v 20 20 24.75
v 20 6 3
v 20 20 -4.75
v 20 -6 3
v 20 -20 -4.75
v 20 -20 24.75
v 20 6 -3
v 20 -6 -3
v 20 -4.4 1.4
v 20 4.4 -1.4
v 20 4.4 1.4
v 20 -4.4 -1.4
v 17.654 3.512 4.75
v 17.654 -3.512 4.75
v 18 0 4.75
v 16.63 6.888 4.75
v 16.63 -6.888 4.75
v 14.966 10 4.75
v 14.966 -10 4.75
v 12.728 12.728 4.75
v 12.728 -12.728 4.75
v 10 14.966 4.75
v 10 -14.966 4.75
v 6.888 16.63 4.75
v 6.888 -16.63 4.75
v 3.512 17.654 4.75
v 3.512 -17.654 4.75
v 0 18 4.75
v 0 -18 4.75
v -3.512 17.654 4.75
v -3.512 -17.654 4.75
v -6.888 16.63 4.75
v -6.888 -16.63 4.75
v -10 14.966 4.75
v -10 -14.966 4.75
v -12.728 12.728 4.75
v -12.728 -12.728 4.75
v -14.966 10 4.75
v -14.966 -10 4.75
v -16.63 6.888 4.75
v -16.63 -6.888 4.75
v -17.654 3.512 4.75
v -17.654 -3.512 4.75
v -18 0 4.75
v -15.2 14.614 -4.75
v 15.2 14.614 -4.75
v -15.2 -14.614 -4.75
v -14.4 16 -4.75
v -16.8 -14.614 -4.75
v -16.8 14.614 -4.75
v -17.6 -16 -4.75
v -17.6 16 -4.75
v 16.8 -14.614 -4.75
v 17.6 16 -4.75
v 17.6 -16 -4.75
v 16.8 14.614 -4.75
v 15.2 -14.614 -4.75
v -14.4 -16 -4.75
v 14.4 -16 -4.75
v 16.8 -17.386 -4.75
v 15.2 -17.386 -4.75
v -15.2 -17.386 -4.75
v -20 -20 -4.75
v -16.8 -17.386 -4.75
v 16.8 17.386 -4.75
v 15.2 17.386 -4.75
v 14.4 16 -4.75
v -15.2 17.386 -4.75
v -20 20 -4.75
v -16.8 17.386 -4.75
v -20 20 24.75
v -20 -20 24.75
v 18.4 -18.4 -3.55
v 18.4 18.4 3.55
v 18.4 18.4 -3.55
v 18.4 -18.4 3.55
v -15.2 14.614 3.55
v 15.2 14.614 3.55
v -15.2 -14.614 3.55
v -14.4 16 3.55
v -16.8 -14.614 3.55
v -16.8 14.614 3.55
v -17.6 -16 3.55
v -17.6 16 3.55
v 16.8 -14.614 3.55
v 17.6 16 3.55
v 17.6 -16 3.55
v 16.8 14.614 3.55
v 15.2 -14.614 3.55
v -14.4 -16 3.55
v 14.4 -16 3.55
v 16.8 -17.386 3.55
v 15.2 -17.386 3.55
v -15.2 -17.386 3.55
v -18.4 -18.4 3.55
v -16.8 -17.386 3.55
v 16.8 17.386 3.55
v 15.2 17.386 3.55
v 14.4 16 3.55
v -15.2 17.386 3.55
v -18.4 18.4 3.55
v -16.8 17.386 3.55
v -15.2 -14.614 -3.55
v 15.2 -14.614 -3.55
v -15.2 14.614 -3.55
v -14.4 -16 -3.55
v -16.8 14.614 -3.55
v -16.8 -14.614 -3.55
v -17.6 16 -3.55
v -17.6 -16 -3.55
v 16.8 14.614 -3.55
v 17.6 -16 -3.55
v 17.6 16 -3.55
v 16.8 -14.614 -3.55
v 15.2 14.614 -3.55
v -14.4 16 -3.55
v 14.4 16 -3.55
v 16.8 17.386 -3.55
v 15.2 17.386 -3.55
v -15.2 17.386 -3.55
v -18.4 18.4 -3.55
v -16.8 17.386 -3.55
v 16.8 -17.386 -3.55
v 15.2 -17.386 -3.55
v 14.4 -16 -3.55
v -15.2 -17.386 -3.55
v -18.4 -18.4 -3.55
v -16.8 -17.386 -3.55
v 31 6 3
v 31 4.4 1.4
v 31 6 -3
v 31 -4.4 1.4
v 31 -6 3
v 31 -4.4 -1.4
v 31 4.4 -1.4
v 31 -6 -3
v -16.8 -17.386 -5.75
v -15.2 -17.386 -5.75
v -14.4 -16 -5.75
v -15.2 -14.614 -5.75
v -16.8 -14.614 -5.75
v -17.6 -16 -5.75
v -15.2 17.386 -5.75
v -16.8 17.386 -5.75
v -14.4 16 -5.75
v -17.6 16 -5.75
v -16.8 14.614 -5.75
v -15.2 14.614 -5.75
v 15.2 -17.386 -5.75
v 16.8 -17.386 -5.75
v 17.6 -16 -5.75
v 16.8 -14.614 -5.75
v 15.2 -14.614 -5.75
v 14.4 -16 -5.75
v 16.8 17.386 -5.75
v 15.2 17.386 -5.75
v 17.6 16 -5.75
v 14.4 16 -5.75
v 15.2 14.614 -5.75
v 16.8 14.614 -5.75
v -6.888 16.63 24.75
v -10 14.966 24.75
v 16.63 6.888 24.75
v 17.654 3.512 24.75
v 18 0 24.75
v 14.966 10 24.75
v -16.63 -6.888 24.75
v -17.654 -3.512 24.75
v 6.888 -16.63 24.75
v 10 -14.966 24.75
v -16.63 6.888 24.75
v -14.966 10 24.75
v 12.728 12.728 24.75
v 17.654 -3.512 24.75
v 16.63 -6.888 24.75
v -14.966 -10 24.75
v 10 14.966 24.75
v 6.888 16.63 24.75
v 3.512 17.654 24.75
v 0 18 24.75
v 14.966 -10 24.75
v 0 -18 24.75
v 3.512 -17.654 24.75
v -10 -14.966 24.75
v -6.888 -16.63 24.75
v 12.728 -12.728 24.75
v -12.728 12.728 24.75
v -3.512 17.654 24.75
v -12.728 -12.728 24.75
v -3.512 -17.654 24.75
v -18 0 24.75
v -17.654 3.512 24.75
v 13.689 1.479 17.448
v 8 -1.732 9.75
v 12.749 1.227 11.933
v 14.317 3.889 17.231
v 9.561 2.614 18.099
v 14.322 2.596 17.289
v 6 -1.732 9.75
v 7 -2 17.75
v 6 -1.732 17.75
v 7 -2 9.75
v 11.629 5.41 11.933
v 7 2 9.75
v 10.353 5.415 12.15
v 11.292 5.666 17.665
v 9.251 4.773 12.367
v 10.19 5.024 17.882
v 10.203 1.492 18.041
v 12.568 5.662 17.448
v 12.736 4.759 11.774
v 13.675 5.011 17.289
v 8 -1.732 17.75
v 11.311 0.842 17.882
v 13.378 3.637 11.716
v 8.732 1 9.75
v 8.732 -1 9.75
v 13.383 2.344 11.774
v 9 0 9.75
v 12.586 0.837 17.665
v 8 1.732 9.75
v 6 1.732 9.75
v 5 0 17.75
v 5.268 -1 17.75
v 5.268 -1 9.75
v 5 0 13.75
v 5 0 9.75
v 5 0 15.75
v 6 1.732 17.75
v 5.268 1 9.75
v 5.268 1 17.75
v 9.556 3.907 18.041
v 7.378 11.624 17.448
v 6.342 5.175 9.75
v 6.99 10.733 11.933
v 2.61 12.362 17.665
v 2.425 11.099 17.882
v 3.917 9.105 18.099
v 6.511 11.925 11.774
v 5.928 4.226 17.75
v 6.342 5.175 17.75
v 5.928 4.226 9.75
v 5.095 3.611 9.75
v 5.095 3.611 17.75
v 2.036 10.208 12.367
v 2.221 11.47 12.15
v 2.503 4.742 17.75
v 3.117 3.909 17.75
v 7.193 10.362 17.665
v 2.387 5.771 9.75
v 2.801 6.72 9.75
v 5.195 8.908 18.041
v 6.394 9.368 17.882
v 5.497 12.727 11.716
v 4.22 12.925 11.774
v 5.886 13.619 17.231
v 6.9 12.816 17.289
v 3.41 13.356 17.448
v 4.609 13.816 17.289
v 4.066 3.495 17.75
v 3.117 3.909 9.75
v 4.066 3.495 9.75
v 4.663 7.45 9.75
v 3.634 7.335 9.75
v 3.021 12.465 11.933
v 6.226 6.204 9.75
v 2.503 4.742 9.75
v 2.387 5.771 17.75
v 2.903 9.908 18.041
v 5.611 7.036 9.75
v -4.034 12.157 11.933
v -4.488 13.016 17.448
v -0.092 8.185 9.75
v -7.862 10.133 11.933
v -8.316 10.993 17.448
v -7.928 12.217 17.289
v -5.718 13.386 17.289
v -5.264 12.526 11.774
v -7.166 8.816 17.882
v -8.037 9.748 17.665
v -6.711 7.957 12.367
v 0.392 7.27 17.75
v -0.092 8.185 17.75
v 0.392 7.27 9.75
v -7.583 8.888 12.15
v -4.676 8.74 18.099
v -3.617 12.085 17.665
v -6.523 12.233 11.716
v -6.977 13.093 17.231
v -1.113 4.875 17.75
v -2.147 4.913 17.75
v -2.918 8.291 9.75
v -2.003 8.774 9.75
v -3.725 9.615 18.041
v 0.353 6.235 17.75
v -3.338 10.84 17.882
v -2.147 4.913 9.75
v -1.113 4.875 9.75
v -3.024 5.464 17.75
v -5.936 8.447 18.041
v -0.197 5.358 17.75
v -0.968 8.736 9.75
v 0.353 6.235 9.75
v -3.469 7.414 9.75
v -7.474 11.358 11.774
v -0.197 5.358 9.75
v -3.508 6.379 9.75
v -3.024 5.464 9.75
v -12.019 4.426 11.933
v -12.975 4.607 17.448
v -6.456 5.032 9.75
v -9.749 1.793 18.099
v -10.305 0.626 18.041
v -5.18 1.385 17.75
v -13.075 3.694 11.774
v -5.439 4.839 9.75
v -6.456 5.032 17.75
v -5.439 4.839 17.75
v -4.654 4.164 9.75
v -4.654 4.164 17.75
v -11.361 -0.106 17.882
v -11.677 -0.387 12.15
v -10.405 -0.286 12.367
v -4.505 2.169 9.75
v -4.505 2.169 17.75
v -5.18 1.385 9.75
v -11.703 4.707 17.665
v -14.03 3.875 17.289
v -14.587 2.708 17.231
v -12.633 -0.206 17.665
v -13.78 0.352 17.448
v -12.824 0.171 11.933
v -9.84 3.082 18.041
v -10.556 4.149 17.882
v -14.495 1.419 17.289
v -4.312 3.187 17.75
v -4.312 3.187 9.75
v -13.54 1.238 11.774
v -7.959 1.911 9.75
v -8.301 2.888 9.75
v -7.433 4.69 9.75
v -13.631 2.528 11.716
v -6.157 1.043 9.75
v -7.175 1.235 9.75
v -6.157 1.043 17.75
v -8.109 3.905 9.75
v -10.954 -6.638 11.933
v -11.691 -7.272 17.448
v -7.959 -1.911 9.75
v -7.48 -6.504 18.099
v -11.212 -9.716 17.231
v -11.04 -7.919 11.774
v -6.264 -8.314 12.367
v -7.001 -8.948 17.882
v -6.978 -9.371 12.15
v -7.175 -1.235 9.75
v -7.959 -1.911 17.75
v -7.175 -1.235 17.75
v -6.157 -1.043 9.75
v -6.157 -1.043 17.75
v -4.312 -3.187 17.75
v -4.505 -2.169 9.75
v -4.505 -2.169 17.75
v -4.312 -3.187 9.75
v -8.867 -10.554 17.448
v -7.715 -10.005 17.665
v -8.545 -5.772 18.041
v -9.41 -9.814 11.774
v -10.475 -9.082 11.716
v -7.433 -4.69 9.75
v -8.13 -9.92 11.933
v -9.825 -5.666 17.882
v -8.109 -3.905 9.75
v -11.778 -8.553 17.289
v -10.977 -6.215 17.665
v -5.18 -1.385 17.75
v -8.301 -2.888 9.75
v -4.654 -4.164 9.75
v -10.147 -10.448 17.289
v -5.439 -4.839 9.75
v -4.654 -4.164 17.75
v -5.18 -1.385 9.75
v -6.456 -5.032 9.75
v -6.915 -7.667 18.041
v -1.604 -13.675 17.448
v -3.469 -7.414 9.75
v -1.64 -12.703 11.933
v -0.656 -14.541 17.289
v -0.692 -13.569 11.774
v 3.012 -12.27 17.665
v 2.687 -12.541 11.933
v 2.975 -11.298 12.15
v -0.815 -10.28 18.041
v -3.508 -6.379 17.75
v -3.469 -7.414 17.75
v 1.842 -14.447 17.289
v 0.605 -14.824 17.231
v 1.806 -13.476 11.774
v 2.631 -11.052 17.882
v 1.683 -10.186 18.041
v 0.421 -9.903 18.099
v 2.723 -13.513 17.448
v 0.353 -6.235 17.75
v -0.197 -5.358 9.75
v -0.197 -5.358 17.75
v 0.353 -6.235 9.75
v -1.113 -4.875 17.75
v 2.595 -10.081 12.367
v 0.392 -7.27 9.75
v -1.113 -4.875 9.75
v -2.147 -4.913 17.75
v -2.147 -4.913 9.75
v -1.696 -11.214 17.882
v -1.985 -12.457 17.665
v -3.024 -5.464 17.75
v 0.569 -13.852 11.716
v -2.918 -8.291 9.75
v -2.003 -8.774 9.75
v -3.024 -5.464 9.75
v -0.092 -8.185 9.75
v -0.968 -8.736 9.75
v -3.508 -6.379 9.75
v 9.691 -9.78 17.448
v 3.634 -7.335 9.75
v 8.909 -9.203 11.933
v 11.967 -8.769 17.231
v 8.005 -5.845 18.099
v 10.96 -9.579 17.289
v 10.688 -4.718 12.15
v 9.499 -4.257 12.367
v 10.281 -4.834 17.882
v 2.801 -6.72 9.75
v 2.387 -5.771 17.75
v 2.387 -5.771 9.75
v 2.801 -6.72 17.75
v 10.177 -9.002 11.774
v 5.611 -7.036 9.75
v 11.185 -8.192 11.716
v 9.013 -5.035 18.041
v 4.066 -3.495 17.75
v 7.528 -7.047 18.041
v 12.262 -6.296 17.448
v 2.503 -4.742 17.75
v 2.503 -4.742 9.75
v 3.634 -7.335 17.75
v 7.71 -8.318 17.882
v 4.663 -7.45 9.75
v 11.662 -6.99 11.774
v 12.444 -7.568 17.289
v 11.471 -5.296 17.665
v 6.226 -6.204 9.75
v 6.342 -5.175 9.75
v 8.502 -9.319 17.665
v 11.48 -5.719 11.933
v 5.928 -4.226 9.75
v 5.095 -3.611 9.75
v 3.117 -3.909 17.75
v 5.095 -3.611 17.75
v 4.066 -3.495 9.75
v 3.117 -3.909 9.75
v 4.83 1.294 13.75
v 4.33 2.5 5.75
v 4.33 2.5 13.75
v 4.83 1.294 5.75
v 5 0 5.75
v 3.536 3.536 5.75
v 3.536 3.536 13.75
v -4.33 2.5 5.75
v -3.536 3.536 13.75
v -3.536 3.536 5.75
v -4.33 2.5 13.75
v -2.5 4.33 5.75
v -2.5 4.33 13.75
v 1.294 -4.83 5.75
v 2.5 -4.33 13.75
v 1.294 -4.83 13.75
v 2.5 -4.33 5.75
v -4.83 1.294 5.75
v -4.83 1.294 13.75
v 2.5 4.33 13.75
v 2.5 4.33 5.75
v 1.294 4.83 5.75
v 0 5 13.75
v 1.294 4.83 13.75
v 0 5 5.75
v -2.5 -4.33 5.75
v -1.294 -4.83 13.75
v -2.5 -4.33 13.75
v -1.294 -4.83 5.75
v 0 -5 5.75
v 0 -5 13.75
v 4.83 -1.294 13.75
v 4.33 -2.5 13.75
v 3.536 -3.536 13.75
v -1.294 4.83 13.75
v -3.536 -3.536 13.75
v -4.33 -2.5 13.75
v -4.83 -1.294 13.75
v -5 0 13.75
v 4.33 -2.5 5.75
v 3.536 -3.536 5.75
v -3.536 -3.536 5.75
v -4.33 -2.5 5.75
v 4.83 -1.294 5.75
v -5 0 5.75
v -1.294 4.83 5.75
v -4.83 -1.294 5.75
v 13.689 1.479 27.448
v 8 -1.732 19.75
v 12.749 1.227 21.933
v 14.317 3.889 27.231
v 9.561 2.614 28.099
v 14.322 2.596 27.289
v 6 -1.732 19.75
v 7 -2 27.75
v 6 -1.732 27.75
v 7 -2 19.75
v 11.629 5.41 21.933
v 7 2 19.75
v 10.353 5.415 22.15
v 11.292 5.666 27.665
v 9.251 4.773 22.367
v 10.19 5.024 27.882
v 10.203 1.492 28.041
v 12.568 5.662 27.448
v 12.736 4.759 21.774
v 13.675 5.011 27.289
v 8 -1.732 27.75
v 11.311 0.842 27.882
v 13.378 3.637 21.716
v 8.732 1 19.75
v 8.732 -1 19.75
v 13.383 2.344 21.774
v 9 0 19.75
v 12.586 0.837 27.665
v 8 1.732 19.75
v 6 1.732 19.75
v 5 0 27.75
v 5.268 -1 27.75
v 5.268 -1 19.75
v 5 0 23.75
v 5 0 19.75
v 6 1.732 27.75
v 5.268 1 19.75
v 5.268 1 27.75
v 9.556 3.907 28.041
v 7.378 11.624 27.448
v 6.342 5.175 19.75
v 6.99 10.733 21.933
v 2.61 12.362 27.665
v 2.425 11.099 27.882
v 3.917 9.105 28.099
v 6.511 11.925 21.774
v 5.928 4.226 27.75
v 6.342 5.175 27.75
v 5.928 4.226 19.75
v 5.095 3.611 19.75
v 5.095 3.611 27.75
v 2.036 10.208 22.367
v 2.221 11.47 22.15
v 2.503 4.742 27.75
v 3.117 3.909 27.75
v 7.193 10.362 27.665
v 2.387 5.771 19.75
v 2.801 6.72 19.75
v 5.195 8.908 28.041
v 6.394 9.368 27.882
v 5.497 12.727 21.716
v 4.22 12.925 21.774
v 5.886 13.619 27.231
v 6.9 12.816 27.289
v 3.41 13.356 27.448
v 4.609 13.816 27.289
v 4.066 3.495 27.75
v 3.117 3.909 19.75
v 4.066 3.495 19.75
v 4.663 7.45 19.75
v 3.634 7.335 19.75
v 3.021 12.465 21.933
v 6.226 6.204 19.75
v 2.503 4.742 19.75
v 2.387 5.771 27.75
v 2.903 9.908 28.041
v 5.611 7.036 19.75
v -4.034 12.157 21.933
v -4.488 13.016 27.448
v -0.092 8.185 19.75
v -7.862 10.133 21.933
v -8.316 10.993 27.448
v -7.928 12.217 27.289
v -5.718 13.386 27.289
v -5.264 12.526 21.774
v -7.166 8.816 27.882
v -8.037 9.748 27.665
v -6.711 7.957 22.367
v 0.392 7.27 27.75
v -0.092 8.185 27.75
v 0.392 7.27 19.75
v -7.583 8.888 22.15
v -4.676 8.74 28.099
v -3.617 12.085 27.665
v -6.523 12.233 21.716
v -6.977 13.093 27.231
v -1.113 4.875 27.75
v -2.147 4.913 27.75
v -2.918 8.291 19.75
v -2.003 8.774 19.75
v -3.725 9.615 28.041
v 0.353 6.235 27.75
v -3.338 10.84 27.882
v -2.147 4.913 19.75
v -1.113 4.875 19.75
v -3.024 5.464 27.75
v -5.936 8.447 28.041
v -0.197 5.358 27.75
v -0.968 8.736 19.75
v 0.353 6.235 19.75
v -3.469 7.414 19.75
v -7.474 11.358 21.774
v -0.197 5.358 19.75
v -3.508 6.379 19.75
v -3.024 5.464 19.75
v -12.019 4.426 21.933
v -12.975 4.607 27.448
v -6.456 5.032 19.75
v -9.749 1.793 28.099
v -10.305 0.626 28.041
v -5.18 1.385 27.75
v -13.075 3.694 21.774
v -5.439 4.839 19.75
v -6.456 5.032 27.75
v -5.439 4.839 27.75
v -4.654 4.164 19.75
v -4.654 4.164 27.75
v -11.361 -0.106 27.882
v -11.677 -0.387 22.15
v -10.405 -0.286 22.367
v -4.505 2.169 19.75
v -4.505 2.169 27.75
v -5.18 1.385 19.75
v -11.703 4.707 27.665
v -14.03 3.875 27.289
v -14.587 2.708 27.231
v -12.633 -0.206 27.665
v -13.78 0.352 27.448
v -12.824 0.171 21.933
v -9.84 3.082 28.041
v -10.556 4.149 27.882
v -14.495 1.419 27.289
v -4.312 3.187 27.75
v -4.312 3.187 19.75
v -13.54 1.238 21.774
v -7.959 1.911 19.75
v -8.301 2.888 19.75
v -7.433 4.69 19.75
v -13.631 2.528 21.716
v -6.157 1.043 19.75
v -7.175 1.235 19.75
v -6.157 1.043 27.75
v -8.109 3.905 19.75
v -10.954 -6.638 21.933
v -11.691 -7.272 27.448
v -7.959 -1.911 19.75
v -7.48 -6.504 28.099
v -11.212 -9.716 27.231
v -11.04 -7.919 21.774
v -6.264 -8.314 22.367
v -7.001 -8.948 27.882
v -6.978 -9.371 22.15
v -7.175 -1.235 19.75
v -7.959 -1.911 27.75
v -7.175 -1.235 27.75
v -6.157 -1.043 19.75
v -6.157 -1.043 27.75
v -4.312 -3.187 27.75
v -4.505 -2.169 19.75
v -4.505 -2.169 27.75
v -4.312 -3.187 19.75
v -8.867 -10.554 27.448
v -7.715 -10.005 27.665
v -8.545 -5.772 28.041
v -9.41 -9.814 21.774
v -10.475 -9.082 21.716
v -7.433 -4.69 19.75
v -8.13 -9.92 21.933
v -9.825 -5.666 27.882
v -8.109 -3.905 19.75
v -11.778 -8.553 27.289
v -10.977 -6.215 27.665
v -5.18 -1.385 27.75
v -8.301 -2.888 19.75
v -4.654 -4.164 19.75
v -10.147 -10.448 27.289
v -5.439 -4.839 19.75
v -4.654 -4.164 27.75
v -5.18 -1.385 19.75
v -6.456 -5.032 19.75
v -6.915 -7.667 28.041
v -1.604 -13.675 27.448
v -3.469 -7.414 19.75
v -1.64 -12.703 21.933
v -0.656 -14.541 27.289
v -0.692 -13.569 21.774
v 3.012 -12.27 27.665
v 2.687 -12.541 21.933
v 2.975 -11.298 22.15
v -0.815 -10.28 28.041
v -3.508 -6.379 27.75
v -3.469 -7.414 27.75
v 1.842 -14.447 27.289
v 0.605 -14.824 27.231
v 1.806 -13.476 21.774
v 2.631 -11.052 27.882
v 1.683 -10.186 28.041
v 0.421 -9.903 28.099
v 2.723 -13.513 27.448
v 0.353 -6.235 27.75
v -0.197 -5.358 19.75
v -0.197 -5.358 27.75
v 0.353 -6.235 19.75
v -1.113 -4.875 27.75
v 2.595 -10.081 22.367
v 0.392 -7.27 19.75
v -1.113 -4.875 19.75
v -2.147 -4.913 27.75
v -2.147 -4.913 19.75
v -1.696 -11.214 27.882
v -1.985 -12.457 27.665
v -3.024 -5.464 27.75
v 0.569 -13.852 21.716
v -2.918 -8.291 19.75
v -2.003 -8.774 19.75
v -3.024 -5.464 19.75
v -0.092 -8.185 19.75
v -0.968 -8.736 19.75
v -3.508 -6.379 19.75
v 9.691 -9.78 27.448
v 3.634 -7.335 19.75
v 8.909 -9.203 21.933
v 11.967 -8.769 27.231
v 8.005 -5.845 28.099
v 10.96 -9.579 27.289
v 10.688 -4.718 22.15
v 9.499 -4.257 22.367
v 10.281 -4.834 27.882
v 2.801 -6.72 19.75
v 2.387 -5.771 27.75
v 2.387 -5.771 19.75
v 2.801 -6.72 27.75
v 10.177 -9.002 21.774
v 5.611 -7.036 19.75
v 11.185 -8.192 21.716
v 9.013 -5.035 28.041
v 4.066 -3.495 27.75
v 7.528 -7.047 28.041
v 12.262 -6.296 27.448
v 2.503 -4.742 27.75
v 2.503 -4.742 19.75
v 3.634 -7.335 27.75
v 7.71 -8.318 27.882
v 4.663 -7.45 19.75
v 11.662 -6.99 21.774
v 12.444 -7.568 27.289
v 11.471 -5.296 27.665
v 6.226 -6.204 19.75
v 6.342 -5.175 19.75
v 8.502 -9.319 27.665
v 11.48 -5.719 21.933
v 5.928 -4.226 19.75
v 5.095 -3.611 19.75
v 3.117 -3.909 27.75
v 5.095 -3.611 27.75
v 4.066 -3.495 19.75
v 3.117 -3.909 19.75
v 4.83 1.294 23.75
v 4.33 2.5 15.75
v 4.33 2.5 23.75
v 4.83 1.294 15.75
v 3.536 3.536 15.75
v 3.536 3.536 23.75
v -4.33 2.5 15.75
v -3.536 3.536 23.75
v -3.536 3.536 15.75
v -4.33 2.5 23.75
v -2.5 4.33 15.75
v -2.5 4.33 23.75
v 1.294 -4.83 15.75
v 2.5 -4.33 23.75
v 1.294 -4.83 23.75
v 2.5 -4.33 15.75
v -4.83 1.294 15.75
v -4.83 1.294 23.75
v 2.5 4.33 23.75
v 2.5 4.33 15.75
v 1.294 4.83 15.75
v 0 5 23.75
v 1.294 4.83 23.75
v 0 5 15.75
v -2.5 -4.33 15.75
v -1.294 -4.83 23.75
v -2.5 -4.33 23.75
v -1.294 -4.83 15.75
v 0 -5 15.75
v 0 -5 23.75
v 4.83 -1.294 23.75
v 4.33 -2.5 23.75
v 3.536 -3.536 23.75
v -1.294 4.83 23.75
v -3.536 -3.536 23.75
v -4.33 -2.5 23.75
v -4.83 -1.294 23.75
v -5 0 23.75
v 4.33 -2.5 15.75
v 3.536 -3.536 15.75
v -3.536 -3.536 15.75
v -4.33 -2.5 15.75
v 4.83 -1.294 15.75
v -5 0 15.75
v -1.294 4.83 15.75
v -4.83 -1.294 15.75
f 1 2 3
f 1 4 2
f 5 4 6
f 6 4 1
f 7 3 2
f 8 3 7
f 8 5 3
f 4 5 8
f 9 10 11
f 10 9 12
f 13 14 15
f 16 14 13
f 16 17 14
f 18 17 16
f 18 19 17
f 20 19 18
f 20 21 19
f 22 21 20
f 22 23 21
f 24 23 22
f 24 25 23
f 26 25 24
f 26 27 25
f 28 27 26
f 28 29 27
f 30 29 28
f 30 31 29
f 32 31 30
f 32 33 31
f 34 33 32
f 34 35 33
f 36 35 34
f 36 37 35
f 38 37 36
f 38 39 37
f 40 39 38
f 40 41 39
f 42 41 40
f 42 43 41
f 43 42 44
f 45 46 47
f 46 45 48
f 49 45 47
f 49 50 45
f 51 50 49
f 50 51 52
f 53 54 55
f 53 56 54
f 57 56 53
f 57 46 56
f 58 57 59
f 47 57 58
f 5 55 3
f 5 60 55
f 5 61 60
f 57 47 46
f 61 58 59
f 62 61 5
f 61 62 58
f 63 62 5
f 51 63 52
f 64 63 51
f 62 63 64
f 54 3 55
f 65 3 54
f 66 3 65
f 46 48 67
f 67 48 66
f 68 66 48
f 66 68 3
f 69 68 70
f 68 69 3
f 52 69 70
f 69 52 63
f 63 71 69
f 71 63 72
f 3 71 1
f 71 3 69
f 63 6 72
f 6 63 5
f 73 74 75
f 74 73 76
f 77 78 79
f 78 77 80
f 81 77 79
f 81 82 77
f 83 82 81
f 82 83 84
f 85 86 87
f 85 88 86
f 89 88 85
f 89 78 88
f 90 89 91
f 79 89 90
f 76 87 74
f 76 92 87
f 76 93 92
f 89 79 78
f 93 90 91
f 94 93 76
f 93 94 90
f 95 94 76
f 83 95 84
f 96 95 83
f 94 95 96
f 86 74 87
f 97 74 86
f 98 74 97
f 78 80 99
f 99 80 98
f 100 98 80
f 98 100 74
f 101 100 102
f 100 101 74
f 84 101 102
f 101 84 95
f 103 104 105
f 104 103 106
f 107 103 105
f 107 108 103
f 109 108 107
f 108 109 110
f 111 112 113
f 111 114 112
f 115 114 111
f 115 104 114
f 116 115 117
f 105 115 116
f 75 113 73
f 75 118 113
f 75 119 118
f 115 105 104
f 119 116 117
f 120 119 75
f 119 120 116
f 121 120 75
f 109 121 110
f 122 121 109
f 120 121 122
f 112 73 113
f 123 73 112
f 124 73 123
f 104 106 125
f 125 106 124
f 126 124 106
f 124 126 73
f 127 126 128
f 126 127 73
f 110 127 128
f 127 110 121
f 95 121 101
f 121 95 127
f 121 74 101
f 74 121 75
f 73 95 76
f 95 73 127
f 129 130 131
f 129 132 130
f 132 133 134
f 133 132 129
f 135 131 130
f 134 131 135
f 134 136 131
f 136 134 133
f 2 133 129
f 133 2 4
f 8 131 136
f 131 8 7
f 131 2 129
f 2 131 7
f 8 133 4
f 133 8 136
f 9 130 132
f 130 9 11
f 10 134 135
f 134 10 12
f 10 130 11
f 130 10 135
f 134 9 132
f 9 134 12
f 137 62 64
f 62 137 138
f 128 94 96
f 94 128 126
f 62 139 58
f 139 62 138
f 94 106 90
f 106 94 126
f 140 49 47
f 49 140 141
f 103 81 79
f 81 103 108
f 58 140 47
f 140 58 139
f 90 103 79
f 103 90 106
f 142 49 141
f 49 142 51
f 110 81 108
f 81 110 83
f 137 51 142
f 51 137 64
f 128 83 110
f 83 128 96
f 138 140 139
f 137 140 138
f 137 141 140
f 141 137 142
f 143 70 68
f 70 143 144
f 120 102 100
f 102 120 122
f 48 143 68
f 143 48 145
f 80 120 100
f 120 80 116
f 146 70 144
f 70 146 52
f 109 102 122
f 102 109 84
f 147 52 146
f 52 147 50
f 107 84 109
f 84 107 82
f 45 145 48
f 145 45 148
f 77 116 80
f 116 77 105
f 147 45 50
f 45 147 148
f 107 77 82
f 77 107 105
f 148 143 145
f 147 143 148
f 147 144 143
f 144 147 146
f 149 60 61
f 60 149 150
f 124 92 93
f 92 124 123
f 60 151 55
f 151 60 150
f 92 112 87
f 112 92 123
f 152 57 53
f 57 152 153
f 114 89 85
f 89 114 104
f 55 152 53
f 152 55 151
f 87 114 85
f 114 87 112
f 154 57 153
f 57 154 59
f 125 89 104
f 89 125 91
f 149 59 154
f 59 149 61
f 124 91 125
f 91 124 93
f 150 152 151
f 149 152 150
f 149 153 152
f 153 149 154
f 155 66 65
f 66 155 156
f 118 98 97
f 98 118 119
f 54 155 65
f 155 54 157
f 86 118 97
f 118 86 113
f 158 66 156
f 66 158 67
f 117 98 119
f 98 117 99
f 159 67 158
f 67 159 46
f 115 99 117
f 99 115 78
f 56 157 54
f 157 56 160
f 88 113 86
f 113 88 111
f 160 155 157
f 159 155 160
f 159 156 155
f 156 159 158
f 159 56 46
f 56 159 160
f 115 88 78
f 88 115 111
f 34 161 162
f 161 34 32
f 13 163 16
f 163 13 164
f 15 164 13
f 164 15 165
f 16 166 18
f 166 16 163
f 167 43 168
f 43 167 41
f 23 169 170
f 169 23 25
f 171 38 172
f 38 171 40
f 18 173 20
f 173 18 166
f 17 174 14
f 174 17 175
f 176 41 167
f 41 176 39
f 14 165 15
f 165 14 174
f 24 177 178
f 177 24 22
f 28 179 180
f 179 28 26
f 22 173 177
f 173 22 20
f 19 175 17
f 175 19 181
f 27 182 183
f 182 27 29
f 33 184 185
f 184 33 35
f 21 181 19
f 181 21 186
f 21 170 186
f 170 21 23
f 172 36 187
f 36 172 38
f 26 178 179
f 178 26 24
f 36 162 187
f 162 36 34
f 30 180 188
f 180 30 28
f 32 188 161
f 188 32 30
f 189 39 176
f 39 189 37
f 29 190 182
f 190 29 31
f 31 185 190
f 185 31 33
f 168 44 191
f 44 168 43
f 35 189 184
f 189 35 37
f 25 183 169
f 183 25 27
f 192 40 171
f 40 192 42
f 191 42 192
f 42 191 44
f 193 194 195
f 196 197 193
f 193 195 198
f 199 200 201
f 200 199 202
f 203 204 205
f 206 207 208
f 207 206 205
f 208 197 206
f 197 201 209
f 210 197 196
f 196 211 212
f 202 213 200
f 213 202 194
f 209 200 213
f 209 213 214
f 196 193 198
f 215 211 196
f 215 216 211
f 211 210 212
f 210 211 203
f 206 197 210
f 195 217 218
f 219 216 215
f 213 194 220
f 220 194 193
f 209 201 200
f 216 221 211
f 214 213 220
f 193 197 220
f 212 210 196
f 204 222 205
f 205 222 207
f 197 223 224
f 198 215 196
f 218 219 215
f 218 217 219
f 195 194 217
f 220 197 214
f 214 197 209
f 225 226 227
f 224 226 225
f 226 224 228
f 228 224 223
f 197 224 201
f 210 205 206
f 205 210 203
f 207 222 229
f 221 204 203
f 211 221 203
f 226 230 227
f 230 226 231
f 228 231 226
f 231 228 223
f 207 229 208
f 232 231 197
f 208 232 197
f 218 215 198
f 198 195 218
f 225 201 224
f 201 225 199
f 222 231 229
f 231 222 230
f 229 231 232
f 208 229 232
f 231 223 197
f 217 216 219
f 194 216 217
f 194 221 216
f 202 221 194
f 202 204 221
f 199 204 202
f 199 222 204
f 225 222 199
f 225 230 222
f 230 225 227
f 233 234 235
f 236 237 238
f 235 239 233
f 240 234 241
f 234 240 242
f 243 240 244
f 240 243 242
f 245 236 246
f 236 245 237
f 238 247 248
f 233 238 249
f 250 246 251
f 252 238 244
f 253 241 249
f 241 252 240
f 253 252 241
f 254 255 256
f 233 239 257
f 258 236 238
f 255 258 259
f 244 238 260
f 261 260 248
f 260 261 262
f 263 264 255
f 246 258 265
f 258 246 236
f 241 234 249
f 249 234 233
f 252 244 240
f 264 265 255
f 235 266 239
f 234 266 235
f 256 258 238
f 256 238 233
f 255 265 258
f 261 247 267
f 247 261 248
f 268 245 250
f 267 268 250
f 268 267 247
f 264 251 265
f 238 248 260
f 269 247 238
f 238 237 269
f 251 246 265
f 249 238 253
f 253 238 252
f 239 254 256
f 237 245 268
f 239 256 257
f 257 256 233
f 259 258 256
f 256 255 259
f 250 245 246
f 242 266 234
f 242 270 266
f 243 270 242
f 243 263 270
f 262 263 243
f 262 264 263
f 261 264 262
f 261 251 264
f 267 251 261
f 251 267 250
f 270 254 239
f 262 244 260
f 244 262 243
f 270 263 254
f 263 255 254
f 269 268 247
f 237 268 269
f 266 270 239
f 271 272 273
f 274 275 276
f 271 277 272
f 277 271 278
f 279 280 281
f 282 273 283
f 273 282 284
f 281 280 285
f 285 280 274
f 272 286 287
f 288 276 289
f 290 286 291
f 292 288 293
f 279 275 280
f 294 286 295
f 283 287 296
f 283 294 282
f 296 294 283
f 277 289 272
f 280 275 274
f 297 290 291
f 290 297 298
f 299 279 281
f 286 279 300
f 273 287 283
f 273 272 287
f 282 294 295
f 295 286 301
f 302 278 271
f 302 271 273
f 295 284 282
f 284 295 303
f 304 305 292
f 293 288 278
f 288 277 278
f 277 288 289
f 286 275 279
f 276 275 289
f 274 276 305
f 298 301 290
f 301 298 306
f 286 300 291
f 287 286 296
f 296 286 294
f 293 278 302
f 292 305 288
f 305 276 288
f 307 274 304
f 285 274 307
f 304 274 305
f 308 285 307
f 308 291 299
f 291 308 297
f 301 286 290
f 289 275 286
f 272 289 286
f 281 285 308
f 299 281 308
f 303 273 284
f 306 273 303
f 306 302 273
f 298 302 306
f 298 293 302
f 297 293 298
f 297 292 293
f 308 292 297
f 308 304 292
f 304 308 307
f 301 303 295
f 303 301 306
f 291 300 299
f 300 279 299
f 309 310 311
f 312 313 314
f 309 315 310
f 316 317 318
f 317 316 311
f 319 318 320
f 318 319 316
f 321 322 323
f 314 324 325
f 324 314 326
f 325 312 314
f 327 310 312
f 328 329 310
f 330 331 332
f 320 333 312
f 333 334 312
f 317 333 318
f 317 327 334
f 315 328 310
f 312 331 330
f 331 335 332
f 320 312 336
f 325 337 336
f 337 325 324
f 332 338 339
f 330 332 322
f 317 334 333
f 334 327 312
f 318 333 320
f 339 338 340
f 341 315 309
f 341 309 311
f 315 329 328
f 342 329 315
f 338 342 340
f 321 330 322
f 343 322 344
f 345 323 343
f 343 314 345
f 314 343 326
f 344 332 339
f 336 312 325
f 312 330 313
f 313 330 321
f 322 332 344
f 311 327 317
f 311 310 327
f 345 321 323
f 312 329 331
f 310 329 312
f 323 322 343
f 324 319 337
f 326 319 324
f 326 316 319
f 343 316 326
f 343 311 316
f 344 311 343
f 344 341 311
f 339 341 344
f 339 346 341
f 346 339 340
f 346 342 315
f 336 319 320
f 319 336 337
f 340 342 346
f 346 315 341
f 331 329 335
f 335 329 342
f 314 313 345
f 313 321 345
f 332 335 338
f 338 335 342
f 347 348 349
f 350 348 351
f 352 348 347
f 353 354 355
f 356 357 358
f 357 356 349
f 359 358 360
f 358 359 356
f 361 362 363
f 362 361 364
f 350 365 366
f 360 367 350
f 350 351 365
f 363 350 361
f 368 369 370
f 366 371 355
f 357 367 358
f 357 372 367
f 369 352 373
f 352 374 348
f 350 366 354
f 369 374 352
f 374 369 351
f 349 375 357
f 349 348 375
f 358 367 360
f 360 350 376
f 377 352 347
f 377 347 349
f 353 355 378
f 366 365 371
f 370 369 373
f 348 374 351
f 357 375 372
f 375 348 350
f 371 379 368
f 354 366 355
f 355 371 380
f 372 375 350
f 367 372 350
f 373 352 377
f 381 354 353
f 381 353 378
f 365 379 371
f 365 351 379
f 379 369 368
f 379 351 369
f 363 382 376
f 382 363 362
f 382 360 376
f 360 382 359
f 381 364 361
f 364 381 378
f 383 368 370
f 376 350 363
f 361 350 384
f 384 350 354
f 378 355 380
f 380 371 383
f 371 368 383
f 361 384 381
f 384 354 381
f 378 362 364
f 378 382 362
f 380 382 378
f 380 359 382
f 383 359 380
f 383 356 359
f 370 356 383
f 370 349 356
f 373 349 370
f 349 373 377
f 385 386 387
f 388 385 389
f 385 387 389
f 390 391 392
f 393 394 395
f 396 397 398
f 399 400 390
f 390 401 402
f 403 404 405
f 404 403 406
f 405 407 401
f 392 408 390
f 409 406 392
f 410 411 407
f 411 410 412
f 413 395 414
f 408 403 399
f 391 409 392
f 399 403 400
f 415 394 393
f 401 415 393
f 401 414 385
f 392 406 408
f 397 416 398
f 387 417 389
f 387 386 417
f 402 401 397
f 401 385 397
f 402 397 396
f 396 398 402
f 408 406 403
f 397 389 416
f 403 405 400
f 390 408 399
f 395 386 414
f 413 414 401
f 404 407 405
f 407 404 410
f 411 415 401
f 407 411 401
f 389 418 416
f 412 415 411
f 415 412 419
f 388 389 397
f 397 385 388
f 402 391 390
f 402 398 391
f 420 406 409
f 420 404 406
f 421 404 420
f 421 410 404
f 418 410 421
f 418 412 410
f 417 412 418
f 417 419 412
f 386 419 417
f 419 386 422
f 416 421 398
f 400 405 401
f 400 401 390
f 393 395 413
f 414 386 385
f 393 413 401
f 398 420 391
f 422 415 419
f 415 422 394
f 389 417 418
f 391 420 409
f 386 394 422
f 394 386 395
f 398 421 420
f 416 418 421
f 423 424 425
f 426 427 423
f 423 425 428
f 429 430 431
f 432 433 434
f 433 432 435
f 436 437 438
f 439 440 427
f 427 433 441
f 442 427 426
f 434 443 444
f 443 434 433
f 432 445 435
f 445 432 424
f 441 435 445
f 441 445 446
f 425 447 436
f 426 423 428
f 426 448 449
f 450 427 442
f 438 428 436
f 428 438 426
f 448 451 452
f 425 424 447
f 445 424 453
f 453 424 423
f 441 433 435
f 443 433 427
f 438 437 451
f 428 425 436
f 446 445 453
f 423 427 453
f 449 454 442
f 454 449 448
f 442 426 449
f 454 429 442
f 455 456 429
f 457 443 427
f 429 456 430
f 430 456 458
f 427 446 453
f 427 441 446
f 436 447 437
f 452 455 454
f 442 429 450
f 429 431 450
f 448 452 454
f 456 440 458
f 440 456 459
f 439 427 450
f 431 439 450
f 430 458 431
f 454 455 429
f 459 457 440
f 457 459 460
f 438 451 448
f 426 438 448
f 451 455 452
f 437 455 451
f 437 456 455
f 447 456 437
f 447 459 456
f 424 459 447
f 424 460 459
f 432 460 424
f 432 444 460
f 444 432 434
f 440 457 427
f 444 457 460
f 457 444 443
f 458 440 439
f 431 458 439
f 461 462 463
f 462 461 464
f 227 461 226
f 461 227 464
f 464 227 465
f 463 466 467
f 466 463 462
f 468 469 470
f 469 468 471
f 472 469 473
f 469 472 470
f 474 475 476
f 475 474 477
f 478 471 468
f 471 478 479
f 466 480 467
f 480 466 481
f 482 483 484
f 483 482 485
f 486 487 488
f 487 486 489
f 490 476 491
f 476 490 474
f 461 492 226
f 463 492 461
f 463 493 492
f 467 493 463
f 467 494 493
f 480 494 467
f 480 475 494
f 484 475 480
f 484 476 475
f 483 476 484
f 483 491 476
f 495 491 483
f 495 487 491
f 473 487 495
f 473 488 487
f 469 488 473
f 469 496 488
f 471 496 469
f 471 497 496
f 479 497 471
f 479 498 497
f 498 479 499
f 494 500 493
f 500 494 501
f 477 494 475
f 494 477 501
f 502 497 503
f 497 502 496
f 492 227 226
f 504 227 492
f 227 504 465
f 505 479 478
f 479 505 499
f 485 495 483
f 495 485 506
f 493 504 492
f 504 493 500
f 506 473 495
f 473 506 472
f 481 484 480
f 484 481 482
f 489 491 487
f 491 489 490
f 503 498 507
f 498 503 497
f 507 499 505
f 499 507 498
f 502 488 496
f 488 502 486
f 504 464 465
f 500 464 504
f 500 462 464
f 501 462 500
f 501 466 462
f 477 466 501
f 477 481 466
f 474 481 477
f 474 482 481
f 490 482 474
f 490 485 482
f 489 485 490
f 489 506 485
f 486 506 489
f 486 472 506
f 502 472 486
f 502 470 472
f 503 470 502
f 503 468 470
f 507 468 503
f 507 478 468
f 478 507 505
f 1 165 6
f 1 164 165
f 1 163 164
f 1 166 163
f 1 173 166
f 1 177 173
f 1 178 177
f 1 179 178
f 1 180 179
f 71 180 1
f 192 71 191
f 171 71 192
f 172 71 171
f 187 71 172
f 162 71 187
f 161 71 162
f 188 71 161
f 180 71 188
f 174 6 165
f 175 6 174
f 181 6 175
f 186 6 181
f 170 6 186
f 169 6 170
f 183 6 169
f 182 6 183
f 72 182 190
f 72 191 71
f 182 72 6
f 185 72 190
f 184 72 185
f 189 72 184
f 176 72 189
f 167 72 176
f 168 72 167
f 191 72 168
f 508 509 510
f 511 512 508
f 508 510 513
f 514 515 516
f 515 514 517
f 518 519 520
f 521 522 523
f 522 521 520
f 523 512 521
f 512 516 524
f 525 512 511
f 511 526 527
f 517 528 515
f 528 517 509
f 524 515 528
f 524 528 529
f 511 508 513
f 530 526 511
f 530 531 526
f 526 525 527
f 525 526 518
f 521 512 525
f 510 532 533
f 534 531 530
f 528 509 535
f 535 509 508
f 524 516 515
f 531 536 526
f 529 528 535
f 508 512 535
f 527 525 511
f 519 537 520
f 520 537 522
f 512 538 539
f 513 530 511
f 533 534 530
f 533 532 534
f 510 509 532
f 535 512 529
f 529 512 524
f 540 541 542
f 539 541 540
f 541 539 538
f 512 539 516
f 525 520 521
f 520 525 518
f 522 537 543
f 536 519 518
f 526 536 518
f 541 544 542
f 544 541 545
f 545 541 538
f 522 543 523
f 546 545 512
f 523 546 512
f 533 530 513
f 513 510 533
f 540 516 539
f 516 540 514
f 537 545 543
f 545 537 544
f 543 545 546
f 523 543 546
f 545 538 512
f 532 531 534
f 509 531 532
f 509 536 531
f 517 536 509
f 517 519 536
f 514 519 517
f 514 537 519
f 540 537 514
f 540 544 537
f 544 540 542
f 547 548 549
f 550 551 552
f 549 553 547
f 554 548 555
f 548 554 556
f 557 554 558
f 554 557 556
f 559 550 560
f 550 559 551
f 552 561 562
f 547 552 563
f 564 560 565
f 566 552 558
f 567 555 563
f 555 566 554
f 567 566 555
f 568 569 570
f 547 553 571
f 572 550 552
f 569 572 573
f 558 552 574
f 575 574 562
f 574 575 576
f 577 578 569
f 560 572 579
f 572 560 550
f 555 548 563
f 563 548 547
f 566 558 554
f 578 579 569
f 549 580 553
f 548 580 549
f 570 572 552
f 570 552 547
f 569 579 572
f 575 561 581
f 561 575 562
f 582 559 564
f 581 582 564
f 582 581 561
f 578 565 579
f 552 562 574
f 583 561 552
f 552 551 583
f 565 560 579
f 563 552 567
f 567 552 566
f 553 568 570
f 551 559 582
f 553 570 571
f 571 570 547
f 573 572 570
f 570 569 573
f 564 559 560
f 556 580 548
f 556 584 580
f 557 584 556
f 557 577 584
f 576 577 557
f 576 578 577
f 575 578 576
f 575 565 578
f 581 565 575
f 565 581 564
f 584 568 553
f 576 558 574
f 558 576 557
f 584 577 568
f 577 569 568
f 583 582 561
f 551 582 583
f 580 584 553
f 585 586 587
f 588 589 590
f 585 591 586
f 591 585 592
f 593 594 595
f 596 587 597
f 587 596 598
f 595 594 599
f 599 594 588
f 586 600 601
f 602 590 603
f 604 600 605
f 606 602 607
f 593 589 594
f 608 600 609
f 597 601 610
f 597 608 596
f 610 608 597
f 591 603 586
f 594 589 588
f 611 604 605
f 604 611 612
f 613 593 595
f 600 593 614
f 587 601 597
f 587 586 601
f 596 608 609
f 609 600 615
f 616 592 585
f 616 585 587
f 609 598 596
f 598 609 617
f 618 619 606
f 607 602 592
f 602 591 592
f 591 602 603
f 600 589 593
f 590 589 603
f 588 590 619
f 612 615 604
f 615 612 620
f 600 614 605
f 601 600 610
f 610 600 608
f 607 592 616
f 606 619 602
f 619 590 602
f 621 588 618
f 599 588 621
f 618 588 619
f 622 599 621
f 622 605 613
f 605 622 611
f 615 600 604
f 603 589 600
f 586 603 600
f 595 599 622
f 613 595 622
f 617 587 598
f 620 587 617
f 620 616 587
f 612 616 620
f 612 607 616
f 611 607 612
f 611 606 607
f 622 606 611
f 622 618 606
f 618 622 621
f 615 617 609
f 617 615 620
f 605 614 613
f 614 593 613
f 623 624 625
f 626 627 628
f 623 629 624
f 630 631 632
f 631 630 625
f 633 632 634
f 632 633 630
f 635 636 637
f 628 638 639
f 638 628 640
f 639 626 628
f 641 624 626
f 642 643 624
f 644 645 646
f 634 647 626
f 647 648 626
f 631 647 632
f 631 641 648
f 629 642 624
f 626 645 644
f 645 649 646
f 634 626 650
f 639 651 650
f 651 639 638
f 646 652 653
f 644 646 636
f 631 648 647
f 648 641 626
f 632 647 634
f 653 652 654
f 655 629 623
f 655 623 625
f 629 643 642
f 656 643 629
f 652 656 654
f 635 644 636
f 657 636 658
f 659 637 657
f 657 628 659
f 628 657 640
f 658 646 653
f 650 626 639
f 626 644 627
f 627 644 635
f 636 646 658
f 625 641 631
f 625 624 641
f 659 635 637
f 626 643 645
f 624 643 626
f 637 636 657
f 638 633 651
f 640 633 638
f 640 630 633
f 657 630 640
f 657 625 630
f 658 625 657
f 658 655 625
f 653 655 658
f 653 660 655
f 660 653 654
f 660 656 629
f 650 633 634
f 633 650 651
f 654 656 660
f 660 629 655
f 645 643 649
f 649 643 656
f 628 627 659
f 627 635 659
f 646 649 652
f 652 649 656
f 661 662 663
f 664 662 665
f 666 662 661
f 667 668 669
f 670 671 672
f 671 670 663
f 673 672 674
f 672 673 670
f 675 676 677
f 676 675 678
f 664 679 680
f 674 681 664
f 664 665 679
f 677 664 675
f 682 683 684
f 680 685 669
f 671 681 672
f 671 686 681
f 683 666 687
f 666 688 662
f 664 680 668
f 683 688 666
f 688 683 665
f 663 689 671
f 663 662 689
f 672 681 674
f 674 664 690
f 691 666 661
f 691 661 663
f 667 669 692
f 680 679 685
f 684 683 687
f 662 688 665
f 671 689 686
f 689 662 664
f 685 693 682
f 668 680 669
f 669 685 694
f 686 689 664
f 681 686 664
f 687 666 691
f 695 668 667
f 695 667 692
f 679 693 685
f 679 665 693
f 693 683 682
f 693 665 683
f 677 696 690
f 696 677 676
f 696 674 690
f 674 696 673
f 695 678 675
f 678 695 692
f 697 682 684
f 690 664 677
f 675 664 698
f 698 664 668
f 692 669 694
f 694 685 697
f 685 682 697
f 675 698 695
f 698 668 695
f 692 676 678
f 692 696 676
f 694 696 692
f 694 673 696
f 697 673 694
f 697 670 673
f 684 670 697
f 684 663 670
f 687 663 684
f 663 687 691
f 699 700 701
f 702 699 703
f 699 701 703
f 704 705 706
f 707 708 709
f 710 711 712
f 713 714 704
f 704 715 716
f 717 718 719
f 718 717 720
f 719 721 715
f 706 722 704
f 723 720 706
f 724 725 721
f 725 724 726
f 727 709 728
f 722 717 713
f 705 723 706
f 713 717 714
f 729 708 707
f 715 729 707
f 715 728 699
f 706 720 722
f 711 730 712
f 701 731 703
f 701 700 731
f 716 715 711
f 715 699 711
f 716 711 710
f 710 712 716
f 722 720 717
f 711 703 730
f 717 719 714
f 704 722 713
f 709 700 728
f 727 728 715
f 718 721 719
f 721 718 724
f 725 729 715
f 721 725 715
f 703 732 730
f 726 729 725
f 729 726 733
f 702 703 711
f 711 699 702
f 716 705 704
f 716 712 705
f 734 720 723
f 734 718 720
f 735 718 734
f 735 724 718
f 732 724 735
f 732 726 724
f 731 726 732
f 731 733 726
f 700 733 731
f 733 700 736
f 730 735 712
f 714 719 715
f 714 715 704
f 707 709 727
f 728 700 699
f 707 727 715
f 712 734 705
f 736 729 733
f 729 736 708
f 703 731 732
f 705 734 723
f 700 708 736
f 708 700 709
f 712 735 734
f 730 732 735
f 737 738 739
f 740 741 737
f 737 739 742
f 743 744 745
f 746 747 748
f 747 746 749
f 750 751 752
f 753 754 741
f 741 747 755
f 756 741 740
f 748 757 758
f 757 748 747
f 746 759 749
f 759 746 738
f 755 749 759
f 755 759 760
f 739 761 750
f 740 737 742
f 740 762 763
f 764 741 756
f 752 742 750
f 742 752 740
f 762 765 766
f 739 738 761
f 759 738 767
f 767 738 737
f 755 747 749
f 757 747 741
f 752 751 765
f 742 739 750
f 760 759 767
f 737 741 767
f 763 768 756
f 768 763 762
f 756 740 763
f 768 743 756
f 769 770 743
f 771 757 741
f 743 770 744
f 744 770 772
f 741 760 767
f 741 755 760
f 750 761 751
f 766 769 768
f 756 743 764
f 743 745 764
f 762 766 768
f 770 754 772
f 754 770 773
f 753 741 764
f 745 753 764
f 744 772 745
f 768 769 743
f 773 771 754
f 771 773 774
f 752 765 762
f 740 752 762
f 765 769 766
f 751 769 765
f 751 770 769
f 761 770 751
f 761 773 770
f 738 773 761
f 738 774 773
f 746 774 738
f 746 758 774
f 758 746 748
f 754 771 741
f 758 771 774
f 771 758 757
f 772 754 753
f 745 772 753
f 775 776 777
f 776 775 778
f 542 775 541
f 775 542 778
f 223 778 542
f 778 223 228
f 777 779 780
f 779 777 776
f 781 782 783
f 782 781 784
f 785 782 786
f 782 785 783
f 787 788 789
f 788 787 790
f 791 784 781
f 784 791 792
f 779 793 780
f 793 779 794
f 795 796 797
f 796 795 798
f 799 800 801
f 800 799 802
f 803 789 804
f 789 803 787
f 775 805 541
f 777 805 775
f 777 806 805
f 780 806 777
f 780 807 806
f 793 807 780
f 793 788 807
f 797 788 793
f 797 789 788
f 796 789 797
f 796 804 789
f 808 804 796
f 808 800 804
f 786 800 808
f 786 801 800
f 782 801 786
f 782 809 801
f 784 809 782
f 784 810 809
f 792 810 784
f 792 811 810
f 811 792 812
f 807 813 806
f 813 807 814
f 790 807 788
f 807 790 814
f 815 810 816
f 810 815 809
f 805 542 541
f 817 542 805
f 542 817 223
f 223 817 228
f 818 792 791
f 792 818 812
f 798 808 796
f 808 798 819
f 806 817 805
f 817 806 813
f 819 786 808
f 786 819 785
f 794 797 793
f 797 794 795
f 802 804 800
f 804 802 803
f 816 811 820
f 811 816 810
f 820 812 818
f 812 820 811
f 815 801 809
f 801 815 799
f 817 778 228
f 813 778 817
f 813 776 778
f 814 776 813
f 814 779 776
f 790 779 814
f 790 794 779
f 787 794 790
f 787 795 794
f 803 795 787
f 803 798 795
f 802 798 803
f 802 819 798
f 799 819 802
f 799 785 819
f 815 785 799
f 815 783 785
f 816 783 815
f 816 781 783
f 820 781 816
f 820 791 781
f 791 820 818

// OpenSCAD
// Parameters
footprint_x = 40.0; //[20.0:80.0:0.5]
footprint_y = 40.0; //[20.0:80.0:0.5]
overall_depth_z = 9.5; //[5.0:19.0:0.1]
wall_thickness = 1.6; //[0.8:3.2:0.1]
base_thickness = 1.2; //[0.6:2.4:0.1]
top_thickness = 1.2; //[0.6:2.4:0.1]
clearance = 0.6; //[0.2:1.5:0.1]
overlap = 1.0; //[0.5:2.0:0.1]
mount_hole_diameter = 3.2; //[2.0:6.0:0.1]
mount_hole_edge_margin = 4.0; //[2.0:8.0:0.5]
outlet_width = 12.0; //[6.0:24.0:0.5]
outlet_height = 6.0; //[3.0:9.5:0.5]
outlet_length = 12.0; //[6.0:30.0:0.5]
outlet_offset_y = 0.0; //[-10.0:10.0:0.5]
outlet_center_z = 0.0; //[-2.0:2.0:0.1]
impeller_outer_diameter = 28.0; //[18.0:36.0:0.5]
impeller_hub_diameter = 10.0; //[6.0:18.0:0.5]
impeller_blade_count = 20; //[8:40:1]
blade_thickness = 0.8; //[0.4:1.6:0.1]
blade_radial_length = 6.0; //[3.0:12.0:0.5]
bore_diameter = 3.0; //[1.5:6.0:0.1]

// Blower module
module blower() {
  color([0.12, 0.12, 0.14]) {
    difference() {
      // Outer casing
      translate([0, 0, 0])
        cube([footprint_x, footprint_y, overall_depth_z], center=true);
      // Inner cavity
      translate([0, 0, 0])
        cube([footprint_x - 2*wall_thickness, footprint_y - 2*wall_thickness, overall_depth_z - base_thickness - top_thickness], center=true);
    }
    // Outlet duct
    difference() {
      translate([footprint_x/2 + outlet_length/2 - overlap, outlet_offset_y, outlet_center_z])
        cube([outlet_length, outlet_width, outlet_height], center=true);
      translate([footprint_x/2 + outlet_length/2 - overlap, outlet_offset_y, outlet_center_z])
        cube([outlet_length + 2*overlap, outlet_width - 2*wall_thickness, outlet_height - 2*wall_thickness], center=true);
    }
    // Mounting holes
    for (x = [-1, 1], y = [-1, 1]) {
      translate([x * (footprint_x/2 - mount_hole_edge_margin), y * (footprint_y/2 - mount_hole_edge_margin), 0])
        cylinder(r=mount_hole_diameter/2, h=overall_depth_z + 2*overlap, center=true);
    }
  }
}

// Fan module
module fan() {
  color([0.15, 0.15, 0.17]) {
    // Frame
    difference() {
      cube([footprint_x, footprint_y, 10], center=true);
      cylinder(d=footprint_x - 4, h=12, center=true, $fn=32);
    }
    // Hub
    cylinder(d=impeller_hub_diameter, h=8, center=true, $fn=24);
    // Blades
    for (i = [0:6]) {
      rotate([0, 0, i * 360 / 7])
        hull() {
          translate([impeller_hub_diameter/2 + 2, 0, 0])
            cylinder(r=2, h=8, $fn=12);
          translate([impeller_outer_diameter/2 - 3, 3, 2.4])
            rotate([0, 10, 15])
            cylinder(r=2.5, h=5.6, $fn=12);
        }
    }
  }
}

// Blower Fan module
module blower_fan() {
  color([0.15, 0.15, 0.17]) {
    // Frame
    difference() {
      cube([footprint_x, footprint_y, 10], center=true);
      cylinder(d=footprint_x - 4, h=12, center=true, $fn=32);
    }
    // Hub
    cylinder(d=impeller_hub_diameter, h=8, center=true, $fn=24);
    // Blades
    for (i = [0:6]) {
      rotate([0, 0, i * 360 / 7])
        hull() {
          translate([impeller_hub_diameter/2 + 2, 0, 0])
            cylinder(r=2, h=8, $fn=12);
          translate([impeller_outer_diameter/2 - 3, 3, 2.4])
            rotate([0, 10, 15])
            cylinder(r=2.5, h=5.6, $fn=12);
        }
    }
  }
}

// Assembly module
module assembly() {
  blower();
  translate([0, 0, overall_depth_z/2 + 5]) fan();
  translate([0, 0, overall_depth_z/2 + 15]) blower_fan();
}

assembly();
